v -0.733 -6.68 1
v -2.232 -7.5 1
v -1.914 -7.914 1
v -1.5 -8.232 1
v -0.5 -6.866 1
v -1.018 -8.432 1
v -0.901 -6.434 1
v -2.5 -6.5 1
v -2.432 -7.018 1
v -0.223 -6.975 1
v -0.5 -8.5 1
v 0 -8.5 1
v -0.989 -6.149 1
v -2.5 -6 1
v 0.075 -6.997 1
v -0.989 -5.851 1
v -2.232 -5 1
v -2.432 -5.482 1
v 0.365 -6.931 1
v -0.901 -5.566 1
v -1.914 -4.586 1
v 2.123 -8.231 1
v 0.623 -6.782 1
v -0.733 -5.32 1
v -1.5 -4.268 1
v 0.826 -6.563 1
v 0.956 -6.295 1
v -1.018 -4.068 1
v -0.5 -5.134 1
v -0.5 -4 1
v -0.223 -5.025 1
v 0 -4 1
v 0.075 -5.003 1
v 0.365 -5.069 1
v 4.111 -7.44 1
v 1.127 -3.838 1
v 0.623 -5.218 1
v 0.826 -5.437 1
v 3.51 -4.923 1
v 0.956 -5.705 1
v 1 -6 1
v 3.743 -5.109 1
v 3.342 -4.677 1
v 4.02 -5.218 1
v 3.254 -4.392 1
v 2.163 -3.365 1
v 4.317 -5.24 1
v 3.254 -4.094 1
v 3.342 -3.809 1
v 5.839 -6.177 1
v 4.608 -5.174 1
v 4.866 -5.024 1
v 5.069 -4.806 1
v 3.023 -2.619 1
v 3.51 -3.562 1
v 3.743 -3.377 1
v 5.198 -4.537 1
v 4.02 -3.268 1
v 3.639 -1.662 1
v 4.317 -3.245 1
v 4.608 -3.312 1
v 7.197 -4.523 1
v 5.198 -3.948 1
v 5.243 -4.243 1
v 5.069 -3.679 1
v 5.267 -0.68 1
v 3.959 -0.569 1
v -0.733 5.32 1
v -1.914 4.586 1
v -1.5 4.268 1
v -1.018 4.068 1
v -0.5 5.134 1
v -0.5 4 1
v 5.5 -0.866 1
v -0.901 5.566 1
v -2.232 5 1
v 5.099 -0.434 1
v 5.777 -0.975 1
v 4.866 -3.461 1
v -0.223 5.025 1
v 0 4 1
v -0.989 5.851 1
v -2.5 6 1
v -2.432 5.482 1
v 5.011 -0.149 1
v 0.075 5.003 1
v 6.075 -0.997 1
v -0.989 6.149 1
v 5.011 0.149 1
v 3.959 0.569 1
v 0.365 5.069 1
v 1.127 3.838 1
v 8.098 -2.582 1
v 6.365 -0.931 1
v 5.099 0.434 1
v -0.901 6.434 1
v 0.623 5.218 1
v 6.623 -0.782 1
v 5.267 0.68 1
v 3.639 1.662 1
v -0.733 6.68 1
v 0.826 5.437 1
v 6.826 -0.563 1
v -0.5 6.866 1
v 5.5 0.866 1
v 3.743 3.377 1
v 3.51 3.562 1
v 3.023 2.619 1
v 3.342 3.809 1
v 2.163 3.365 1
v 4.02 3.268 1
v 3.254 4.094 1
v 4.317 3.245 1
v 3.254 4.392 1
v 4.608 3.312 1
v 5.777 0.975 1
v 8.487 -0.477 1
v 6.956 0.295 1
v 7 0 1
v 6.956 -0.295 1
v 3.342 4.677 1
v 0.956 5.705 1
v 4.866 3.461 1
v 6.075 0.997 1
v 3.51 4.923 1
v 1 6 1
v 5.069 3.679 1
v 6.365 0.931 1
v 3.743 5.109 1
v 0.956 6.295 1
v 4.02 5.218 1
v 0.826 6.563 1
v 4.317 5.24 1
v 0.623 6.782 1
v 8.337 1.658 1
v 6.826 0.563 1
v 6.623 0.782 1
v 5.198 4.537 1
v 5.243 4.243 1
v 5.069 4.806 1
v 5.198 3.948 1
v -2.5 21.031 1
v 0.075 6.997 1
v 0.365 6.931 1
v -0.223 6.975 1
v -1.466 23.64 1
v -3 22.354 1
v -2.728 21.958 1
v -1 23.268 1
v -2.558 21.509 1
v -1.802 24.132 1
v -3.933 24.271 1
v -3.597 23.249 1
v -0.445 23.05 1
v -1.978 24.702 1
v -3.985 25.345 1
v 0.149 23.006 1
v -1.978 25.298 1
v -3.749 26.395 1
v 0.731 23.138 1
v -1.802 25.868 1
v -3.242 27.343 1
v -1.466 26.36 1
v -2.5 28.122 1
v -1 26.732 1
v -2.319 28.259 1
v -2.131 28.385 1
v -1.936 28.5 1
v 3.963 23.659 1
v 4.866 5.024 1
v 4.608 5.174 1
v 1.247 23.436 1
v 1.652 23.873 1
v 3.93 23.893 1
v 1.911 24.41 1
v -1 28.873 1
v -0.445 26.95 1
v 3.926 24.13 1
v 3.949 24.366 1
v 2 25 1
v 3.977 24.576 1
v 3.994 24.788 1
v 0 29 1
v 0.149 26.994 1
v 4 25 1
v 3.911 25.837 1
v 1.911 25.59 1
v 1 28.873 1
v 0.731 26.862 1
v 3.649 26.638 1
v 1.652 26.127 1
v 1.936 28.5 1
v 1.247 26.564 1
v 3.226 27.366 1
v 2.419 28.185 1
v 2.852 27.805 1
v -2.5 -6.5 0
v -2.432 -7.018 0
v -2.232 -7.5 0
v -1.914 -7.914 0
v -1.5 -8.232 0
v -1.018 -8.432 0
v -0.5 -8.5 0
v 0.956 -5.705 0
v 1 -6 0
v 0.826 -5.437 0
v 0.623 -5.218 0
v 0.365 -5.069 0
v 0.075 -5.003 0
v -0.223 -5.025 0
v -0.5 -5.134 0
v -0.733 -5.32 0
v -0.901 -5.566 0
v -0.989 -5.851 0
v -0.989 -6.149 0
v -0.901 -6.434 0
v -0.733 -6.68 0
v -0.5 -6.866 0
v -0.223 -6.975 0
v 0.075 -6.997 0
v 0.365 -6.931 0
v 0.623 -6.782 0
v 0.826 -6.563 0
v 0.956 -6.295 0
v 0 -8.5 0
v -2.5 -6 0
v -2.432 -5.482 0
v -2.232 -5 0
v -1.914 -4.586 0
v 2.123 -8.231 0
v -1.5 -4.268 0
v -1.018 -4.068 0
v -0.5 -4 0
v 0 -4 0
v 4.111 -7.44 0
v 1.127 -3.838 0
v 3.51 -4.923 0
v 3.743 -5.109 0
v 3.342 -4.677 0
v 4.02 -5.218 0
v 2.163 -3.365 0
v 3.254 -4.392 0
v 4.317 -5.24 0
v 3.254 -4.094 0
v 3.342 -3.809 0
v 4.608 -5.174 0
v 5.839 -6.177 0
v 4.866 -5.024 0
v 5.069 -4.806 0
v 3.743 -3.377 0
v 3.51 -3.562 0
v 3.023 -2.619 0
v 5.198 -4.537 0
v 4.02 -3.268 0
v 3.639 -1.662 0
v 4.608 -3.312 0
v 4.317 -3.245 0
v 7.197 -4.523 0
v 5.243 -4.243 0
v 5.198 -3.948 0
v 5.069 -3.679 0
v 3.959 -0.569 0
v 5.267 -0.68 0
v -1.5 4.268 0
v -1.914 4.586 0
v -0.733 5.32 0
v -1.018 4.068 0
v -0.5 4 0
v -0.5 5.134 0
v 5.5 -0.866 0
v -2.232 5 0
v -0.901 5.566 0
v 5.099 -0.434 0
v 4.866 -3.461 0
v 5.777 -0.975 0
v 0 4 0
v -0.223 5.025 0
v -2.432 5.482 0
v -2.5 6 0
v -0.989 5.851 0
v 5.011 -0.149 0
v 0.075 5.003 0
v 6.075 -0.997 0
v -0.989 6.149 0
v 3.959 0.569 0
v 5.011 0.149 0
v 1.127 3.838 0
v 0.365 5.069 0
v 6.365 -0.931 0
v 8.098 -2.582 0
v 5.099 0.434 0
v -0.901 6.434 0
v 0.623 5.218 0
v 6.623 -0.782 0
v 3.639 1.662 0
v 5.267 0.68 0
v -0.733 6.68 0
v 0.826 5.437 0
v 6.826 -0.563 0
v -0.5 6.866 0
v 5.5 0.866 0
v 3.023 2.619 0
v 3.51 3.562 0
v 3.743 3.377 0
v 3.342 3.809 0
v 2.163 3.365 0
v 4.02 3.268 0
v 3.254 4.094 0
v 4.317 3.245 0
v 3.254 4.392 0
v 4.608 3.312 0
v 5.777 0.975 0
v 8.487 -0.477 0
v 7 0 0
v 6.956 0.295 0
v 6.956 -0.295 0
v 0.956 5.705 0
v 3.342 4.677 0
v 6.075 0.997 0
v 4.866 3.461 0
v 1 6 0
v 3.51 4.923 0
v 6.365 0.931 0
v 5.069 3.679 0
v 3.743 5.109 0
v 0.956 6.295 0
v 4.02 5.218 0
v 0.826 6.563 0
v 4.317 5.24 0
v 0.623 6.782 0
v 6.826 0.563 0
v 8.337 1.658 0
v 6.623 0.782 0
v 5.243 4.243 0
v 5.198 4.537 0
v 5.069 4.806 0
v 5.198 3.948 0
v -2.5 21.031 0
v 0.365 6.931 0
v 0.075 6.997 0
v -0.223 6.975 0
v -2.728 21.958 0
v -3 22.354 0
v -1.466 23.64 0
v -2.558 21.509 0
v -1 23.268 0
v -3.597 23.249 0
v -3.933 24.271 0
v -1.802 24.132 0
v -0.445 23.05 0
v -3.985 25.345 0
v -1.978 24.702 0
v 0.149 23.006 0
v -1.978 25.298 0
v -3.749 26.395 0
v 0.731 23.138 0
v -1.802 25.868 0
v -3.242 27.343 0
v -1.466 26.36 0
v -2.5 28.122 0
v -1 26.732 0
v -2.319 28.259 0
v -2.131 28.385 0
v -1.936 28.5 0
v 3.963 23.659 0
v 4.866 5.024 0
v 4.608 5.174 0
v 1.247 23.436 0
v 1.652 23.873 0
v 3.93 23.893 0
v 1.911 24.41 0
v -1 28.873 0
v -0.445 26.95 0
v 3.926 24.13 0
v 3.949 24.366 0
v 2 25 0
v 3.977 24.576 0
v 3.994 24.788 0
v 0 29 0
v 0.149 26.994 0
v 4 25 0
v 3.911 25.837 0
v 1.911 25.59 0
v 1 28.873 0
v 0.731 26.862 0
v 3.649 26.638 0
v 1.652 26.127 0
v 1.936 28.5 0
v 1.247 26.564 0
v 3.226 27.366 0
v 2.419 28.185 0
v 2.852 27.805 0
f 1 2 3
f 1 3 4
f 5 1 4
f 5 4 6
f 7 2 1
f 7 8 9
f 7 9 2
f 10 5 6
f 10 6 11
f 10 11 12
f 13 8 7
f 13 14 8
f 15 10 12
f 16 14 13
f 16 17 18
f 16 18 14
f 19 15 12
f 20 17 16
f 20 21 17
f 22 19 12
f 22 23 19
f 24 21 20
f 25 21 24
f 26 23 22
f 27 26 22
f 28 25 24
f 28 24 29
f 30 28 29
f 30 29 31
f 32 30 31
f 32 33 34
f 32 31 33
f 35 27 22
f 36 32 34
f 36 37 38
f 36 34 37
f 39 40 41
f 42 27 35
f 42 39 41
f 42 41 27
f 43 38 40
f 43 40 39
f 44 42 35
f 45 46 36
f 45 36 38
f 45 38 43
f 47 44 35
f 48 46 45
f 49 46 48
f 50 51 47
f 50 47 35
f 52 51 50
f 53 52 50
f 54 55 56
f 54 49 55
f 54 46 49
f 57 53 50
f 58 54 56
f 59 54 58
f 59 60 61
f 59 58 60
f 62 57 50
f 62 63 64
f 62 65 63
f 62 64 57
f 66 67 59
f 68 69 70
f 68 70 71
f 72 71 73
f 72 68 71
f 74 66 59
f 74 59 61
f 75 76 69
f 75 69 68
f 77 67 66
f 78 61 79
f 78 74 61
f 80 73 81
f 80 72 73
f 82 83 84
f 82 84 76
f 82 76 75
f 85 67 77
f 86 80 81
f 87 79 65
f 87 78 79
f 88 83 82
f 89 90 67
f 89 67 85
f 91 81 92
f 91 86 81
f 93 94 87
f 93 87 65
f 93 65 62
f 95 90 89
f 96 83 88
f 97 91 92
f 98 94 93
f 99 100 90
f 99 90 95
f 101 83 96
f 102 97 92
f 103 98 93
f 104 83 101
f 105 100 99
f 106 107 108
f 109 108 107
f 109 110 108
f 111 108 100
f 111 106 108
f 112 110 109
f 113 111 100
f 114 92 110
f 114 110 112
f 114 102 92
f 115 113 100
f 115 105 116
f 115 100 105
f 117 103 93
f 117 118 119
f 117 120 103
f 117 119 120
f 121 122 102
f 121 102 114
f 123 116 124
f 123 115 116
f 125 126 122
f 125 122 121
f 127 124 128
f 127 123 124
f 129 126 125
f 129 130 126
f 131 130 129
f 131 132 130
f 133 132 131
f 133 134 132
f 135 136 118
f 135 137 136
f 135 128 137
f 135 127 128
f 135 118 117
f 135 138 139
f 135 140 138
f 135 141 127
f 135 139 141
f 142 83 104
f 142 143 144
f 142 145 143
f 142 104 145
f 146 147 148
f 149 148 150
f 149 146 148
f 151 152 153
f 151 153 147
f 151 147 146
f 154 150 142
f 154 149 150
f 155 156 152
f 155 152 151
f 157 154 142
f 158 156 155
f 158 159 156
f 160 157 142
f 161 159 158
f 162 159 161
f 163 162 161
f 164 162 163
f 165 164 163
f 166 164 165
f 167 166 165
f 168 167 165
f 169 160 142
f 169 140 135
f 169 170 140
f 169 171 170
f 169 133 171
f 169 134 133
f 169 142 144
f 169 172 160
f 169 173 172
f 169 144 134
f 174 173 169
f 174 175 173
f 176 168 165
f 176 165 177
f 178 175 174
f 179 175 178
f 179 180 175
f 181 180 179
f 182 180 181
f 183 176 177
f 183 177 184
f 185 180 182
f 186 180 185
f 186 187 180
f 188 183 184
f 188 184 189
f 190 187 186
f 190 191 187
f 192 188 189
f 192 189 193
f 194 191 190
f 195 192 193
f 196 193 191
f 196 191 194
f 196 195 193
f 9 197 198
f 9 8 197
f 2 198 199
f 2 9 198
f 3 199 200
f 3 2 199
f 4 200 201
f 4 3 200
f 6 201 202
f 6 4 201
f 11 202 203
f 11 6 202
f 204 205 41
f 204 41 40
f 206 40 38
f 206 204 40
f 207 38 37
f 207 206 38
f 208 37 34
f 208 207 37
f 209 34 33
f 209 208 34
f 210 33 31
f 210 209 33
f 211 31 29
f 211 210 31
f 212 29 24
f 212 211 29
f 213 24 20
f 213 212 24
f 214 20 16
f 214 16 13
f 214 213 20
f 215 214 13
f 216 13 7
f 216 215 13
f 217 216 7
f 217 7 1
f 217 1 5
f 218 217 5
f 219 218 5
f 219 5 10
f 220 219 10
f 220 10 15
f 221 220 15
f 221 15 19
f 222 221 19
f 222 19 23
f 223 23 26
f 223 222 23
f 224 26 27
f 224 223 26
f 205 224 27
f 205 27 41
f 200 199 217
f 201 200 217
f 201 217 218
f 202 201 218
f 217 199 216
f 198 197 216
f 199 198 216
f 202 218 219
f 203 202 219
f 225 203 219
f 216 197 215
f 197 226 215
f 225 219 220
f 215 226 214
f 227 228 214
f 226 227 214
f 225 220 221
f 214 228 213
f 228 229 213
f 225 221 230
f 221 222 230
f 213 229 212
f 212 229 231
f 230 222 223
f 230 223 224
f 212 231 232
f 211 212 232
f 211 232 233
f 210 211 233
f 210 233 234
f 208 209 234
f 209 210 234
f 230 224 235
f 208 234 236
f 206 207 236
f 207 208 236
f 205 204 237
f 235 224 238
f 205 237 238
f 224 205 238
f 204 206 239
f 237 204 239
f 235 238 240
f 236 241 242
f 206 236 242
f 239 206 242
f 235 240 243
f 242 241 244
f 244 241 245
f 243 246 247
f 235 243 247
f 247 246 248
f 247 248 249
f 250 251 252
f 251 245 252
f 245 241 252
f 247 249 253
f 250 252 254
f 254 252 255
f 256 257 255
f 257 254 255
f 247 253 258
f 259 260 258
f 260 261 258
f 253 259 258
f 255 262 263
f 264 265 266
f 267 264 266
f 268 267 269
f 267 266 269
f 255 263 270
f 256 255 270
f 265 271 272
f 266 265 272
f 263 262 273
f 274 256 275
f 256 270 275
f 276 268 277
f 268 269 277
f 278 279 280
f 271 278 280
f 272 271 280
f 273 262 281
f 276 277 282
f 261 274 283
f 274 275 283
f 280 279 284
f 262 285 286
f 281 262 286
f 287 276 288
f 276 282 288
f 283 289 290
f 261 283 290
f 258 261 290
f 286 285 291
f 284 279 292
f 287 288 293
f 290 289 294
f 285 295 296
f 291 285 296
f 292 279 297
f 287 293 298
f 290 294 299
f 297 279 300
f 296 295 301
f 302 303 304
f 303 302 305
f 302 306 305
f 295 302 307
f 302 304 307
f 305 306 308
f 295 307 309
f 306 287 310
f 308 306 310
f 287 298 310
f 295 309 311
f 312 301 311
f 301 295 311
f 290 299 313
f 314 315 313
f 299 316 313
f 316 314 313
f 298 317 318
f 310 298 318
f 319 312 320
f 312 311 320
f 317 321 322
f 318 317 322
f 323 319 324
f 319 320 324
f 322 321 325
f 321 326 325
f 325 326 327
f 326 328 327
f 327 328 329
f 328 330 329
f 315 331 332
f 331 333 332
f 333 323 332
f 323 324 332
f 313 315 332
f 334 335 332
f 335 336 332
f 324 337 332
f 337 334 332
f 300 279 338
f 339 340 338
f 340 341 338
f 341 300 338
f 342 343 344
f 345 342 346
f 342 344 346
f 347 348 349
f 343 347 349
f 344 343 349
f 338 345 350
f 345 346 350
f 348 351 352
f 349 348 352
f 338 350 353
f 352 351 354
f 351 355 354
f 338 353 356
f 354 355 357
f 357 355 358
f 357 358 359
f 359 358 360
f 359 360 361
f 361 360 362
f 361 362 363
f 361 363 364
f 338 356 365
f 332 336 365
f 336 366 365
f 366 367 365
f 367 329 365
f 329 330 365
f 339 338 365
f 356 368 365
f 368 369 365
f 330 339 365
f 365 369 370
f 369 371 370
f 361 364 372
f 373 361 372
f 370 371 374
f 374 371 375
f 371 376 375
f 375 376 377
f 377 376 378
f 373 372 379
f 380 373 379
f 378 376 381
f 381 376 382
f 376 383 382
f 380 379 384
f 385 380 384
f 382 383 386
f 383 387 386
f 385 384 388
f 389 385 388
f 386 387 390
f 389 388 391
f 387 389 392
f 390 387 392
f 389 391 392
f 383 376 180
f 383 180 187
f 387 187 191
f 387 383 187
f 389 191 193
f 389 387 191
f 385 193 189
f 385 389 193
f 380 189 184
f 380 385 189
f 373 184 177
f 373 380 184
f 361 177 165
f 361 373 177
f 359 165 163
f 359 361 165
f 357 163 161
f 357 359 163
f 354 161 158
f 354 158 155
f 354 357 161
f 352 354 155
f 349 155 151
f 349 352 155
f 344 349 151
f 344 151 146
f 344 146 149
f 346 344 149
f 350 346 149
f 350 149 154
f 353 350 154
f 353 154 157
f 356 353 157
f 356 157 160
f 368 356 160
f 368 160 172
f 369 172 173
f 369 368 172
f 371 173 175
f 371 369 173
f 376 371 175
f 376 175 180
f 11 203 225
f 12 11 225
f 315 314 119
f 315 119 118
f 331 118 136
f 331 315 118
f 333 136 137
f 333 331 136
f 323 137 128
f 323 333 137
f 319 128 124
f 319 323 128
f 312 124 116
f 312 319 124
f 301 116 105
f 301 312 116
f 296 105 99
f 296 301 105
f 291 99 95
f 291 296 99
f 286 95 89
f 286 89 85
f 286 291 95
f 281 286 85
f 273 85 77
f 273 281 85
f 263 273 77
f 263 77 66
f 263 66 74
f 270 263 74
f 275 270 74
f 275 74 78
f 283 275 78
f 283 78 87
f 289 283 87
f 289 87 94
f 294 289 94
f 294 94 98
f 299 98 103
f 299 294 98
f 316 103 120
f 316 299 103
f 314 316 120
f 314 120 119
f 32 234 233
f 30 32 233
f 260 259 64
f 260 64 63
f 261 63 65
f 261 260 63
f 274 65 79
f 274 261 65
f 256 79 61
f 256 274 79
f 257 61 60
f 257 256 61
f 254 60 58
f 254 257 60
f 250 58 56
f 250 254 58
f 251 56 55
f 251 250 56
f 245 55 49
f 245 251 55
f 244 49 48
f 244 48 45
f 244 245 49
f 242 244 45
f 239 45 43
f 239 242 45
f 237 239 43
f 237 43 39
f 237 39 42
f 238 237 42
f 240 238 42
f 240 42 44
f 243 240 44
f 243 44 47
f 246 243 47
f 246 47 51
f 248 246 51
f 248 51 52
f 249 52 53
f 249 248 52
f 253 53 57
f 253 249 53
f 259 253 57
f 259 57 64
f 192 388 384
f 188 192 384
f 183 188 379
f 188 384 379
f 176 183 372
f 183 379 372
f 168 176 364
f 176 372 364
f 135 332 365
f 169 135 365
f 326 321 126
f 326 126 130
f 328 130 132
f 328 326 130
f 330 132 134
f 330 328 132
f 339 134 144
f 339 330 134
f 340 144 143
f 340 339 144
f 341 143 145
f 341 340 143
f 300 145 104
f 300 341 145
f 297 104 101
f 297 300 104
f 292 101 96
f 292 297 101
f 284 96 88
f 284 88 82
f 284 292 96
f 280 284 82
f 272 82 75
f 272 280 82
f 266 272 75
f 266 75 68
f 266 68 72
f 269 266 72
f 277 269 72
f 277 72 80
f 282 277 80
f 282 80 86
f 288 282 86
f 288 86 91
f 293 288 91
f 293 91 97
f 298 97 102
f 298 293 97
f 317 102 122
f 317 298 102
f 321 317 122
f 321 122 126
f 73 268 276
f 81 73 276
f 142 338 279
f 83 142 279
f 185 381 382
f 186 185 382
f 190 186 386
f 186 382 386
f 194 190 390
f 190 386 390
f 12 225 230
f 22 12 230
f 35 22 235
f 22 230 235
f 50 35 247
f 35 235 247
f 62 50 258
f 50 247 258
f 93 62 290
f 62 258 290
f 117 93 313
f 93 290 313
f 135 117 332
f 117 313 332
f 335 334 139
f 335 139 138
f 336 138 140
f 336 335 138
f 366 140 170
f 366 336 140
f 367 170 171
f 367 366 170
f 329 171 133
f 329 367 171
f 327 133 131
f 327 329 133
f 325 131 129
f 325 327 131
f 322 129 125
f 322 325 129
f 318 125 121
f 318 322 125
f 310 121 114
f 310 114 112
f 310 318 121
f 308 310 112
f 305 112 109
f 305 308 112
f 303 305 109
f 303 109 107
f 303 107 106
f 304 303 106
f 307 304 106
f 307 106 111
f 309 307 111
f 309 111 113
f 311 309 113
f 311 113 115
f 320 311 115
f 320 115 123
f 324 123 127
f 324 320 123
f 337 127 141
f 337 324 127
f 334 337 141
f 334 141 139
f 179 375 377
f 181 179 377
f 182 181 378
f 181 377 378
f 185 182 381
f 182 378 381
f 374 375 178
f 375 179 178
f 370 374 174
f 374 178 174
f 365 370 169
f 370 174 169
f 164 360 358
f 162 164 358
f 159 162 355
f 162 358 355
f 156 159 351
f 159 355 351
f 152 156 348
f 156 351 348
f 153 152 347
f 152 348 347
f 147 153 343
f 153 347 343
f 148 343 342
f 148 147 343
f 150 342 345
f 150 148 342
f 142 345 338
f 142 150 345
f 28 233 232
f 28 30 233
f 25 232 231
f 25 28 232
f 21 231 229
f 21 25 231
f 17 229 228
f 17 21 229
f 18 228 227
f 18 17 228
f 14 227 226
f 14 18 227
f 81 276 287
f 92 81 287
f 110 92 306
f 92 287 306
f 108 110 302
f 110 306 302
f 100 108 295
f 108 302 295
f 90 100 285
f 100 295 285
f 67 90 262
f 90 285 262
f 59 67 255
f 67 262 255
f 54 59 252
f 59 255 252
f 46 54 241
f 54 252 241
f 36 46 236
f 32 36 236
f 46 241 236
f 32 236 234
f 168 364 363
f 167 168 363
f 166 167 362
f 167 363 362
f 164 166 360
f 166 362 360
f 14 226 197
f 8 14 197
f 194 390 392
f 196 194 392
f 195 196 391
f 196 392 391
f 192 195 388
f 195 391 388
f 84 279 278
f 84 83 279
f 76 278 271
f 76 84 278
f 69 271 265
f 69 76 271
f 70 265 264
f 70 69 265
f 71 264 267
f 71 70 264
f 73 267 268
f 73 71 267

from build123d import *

# Parameters (mm, degrees)
F0_R     = 1
F0_R_2   = 2
F1_DEPTH = 1
F2_R     = 2


with BuildPart() as f1:
    # F0 (on Top) → F1 (new body)
    with BuildSketch(Plane.XY):
        with BuildLine():
            ThreePointArc((-2.5, 28.1224989992), (-4, 25), (-2.5, 21.8775010008))
            Line((-2.5, 21.8775010008), (-2.5, 28.1224989992))
        make_face()
        with BuildLine():
            ThreePointArc((1.9364916731, 28.5), (0, 29), (-1.9364916731, 28.5))
            Line((-1.9364916731, 28.5), (1.9364916731, 28.5))
        make_face()
        with BuildLine():
            Line((3.2255519271, 27.3655474558), (3.8851082618, 24.0481944557))
            ThreePointArc((3.8851082618, 24.0481944557), (3.9711731923, 24.5206426422), (4, 25))
            ThreePointArc((4, 25), (3.8014607527, 26.2445465624), (3.2255519271, 27.3655474558))
        make_face()
        with BuildLine():
            ThreePointArc((0, -8.5), (-1.2640556872, -8.4054841157), (-2.5, -8.1240384046))
            Line((-2.5, -8.1240384046), (-2.5, -8.5))
            Line((-2.5, -8.5), (0, -8.5))
        make_face()
        with BuildLine():
            ThreePointArc((0, 4), (4, 0), (0, -4))
            Line((0, -4), (-2.5, -4))
            Line((-2.5, -4), (-2.5, -8.1240384046))
            ThreePointArc((-2.5, -8.1240384046), (-1.2640556872, -8.4054841157), (0, -8.5))
            ThreePointArc((0, -8.5), (6.5703494482, -5.3926346185), (8.3368220918, 1.6575274991))
            Line((8.3368220918, 1.6575274991), (3.8851082618, 24.0481944557))
            ThreePointArc((3.8851082618, 24.0481944557), (1.2874815505, 21.2128650332), (-2.5, 21.8775010008))
            Line((-2.5, 21.8775010008), (-2.5, 4))
            Line((-2.5, 4), (0, 4))
        make_face()
        with Locations((0, -6)):
            Circle(F0_R, mode=Mode.SUBTRACT)
        with Locations((0, 6)):
            Circle(F0_R, mode=Mode.SUBTRACT)
        with Locations((4.2426406871, -4.2426406871)):
            Circle(F0_R, mode=Mode.SUBTRACT)
        with Locations((6, 0)):
            Circle(F0_R, mode=Mode.SUBTRACT)
        with Locations((4.2426406871, 4.2426406871)):
            Circle(F0_R, mode=Mode.SUBTRACT)
        with BuildLine():
            Line((-2.5, 28.1224989992), (-2.5, 21.8775010008))
            ThreePointArc((-2.5, 21.8775010008), (1.2874815505, 21.2128650332), (3.8851082618, 24.0481944557))
            Line((3.8851082618, 24.0481944557), (3.2255519271, 27.3655474558))
            ThreePointArc((3.2255519271, 27.3655474558), (2.6426159721, 28.002762199), (1.9364916731, 28.5))
            Line((1.9364916731, 28.5), (-1.9364916731, 28.5))
            ThreePointArc((-1.9364916731, 28.5), (-2.2262617418, 28.3232151085), (-2.5, 28.1224989992))
        make_face()
        with Locations((0, 25)):
            Circle(F0_R_2, mode=Mode.SUBTRACT)
    extrude(amount=F1_DEPTH)

    # F2
    f2_edges = [f1.edges().sort_by_distance(p)[0] for p in [
        (-2.5, 4, 0.5),
        (-2.5, -4, 0.5),
        (-2.5, -8.5, 0.5),
        (-2.5, 21.877501, 0.5),
        (3.885108, 24.048194, 0.5),
    ]]
    fillet(f2_edges, radius=F2_R)


solid = f1.part
